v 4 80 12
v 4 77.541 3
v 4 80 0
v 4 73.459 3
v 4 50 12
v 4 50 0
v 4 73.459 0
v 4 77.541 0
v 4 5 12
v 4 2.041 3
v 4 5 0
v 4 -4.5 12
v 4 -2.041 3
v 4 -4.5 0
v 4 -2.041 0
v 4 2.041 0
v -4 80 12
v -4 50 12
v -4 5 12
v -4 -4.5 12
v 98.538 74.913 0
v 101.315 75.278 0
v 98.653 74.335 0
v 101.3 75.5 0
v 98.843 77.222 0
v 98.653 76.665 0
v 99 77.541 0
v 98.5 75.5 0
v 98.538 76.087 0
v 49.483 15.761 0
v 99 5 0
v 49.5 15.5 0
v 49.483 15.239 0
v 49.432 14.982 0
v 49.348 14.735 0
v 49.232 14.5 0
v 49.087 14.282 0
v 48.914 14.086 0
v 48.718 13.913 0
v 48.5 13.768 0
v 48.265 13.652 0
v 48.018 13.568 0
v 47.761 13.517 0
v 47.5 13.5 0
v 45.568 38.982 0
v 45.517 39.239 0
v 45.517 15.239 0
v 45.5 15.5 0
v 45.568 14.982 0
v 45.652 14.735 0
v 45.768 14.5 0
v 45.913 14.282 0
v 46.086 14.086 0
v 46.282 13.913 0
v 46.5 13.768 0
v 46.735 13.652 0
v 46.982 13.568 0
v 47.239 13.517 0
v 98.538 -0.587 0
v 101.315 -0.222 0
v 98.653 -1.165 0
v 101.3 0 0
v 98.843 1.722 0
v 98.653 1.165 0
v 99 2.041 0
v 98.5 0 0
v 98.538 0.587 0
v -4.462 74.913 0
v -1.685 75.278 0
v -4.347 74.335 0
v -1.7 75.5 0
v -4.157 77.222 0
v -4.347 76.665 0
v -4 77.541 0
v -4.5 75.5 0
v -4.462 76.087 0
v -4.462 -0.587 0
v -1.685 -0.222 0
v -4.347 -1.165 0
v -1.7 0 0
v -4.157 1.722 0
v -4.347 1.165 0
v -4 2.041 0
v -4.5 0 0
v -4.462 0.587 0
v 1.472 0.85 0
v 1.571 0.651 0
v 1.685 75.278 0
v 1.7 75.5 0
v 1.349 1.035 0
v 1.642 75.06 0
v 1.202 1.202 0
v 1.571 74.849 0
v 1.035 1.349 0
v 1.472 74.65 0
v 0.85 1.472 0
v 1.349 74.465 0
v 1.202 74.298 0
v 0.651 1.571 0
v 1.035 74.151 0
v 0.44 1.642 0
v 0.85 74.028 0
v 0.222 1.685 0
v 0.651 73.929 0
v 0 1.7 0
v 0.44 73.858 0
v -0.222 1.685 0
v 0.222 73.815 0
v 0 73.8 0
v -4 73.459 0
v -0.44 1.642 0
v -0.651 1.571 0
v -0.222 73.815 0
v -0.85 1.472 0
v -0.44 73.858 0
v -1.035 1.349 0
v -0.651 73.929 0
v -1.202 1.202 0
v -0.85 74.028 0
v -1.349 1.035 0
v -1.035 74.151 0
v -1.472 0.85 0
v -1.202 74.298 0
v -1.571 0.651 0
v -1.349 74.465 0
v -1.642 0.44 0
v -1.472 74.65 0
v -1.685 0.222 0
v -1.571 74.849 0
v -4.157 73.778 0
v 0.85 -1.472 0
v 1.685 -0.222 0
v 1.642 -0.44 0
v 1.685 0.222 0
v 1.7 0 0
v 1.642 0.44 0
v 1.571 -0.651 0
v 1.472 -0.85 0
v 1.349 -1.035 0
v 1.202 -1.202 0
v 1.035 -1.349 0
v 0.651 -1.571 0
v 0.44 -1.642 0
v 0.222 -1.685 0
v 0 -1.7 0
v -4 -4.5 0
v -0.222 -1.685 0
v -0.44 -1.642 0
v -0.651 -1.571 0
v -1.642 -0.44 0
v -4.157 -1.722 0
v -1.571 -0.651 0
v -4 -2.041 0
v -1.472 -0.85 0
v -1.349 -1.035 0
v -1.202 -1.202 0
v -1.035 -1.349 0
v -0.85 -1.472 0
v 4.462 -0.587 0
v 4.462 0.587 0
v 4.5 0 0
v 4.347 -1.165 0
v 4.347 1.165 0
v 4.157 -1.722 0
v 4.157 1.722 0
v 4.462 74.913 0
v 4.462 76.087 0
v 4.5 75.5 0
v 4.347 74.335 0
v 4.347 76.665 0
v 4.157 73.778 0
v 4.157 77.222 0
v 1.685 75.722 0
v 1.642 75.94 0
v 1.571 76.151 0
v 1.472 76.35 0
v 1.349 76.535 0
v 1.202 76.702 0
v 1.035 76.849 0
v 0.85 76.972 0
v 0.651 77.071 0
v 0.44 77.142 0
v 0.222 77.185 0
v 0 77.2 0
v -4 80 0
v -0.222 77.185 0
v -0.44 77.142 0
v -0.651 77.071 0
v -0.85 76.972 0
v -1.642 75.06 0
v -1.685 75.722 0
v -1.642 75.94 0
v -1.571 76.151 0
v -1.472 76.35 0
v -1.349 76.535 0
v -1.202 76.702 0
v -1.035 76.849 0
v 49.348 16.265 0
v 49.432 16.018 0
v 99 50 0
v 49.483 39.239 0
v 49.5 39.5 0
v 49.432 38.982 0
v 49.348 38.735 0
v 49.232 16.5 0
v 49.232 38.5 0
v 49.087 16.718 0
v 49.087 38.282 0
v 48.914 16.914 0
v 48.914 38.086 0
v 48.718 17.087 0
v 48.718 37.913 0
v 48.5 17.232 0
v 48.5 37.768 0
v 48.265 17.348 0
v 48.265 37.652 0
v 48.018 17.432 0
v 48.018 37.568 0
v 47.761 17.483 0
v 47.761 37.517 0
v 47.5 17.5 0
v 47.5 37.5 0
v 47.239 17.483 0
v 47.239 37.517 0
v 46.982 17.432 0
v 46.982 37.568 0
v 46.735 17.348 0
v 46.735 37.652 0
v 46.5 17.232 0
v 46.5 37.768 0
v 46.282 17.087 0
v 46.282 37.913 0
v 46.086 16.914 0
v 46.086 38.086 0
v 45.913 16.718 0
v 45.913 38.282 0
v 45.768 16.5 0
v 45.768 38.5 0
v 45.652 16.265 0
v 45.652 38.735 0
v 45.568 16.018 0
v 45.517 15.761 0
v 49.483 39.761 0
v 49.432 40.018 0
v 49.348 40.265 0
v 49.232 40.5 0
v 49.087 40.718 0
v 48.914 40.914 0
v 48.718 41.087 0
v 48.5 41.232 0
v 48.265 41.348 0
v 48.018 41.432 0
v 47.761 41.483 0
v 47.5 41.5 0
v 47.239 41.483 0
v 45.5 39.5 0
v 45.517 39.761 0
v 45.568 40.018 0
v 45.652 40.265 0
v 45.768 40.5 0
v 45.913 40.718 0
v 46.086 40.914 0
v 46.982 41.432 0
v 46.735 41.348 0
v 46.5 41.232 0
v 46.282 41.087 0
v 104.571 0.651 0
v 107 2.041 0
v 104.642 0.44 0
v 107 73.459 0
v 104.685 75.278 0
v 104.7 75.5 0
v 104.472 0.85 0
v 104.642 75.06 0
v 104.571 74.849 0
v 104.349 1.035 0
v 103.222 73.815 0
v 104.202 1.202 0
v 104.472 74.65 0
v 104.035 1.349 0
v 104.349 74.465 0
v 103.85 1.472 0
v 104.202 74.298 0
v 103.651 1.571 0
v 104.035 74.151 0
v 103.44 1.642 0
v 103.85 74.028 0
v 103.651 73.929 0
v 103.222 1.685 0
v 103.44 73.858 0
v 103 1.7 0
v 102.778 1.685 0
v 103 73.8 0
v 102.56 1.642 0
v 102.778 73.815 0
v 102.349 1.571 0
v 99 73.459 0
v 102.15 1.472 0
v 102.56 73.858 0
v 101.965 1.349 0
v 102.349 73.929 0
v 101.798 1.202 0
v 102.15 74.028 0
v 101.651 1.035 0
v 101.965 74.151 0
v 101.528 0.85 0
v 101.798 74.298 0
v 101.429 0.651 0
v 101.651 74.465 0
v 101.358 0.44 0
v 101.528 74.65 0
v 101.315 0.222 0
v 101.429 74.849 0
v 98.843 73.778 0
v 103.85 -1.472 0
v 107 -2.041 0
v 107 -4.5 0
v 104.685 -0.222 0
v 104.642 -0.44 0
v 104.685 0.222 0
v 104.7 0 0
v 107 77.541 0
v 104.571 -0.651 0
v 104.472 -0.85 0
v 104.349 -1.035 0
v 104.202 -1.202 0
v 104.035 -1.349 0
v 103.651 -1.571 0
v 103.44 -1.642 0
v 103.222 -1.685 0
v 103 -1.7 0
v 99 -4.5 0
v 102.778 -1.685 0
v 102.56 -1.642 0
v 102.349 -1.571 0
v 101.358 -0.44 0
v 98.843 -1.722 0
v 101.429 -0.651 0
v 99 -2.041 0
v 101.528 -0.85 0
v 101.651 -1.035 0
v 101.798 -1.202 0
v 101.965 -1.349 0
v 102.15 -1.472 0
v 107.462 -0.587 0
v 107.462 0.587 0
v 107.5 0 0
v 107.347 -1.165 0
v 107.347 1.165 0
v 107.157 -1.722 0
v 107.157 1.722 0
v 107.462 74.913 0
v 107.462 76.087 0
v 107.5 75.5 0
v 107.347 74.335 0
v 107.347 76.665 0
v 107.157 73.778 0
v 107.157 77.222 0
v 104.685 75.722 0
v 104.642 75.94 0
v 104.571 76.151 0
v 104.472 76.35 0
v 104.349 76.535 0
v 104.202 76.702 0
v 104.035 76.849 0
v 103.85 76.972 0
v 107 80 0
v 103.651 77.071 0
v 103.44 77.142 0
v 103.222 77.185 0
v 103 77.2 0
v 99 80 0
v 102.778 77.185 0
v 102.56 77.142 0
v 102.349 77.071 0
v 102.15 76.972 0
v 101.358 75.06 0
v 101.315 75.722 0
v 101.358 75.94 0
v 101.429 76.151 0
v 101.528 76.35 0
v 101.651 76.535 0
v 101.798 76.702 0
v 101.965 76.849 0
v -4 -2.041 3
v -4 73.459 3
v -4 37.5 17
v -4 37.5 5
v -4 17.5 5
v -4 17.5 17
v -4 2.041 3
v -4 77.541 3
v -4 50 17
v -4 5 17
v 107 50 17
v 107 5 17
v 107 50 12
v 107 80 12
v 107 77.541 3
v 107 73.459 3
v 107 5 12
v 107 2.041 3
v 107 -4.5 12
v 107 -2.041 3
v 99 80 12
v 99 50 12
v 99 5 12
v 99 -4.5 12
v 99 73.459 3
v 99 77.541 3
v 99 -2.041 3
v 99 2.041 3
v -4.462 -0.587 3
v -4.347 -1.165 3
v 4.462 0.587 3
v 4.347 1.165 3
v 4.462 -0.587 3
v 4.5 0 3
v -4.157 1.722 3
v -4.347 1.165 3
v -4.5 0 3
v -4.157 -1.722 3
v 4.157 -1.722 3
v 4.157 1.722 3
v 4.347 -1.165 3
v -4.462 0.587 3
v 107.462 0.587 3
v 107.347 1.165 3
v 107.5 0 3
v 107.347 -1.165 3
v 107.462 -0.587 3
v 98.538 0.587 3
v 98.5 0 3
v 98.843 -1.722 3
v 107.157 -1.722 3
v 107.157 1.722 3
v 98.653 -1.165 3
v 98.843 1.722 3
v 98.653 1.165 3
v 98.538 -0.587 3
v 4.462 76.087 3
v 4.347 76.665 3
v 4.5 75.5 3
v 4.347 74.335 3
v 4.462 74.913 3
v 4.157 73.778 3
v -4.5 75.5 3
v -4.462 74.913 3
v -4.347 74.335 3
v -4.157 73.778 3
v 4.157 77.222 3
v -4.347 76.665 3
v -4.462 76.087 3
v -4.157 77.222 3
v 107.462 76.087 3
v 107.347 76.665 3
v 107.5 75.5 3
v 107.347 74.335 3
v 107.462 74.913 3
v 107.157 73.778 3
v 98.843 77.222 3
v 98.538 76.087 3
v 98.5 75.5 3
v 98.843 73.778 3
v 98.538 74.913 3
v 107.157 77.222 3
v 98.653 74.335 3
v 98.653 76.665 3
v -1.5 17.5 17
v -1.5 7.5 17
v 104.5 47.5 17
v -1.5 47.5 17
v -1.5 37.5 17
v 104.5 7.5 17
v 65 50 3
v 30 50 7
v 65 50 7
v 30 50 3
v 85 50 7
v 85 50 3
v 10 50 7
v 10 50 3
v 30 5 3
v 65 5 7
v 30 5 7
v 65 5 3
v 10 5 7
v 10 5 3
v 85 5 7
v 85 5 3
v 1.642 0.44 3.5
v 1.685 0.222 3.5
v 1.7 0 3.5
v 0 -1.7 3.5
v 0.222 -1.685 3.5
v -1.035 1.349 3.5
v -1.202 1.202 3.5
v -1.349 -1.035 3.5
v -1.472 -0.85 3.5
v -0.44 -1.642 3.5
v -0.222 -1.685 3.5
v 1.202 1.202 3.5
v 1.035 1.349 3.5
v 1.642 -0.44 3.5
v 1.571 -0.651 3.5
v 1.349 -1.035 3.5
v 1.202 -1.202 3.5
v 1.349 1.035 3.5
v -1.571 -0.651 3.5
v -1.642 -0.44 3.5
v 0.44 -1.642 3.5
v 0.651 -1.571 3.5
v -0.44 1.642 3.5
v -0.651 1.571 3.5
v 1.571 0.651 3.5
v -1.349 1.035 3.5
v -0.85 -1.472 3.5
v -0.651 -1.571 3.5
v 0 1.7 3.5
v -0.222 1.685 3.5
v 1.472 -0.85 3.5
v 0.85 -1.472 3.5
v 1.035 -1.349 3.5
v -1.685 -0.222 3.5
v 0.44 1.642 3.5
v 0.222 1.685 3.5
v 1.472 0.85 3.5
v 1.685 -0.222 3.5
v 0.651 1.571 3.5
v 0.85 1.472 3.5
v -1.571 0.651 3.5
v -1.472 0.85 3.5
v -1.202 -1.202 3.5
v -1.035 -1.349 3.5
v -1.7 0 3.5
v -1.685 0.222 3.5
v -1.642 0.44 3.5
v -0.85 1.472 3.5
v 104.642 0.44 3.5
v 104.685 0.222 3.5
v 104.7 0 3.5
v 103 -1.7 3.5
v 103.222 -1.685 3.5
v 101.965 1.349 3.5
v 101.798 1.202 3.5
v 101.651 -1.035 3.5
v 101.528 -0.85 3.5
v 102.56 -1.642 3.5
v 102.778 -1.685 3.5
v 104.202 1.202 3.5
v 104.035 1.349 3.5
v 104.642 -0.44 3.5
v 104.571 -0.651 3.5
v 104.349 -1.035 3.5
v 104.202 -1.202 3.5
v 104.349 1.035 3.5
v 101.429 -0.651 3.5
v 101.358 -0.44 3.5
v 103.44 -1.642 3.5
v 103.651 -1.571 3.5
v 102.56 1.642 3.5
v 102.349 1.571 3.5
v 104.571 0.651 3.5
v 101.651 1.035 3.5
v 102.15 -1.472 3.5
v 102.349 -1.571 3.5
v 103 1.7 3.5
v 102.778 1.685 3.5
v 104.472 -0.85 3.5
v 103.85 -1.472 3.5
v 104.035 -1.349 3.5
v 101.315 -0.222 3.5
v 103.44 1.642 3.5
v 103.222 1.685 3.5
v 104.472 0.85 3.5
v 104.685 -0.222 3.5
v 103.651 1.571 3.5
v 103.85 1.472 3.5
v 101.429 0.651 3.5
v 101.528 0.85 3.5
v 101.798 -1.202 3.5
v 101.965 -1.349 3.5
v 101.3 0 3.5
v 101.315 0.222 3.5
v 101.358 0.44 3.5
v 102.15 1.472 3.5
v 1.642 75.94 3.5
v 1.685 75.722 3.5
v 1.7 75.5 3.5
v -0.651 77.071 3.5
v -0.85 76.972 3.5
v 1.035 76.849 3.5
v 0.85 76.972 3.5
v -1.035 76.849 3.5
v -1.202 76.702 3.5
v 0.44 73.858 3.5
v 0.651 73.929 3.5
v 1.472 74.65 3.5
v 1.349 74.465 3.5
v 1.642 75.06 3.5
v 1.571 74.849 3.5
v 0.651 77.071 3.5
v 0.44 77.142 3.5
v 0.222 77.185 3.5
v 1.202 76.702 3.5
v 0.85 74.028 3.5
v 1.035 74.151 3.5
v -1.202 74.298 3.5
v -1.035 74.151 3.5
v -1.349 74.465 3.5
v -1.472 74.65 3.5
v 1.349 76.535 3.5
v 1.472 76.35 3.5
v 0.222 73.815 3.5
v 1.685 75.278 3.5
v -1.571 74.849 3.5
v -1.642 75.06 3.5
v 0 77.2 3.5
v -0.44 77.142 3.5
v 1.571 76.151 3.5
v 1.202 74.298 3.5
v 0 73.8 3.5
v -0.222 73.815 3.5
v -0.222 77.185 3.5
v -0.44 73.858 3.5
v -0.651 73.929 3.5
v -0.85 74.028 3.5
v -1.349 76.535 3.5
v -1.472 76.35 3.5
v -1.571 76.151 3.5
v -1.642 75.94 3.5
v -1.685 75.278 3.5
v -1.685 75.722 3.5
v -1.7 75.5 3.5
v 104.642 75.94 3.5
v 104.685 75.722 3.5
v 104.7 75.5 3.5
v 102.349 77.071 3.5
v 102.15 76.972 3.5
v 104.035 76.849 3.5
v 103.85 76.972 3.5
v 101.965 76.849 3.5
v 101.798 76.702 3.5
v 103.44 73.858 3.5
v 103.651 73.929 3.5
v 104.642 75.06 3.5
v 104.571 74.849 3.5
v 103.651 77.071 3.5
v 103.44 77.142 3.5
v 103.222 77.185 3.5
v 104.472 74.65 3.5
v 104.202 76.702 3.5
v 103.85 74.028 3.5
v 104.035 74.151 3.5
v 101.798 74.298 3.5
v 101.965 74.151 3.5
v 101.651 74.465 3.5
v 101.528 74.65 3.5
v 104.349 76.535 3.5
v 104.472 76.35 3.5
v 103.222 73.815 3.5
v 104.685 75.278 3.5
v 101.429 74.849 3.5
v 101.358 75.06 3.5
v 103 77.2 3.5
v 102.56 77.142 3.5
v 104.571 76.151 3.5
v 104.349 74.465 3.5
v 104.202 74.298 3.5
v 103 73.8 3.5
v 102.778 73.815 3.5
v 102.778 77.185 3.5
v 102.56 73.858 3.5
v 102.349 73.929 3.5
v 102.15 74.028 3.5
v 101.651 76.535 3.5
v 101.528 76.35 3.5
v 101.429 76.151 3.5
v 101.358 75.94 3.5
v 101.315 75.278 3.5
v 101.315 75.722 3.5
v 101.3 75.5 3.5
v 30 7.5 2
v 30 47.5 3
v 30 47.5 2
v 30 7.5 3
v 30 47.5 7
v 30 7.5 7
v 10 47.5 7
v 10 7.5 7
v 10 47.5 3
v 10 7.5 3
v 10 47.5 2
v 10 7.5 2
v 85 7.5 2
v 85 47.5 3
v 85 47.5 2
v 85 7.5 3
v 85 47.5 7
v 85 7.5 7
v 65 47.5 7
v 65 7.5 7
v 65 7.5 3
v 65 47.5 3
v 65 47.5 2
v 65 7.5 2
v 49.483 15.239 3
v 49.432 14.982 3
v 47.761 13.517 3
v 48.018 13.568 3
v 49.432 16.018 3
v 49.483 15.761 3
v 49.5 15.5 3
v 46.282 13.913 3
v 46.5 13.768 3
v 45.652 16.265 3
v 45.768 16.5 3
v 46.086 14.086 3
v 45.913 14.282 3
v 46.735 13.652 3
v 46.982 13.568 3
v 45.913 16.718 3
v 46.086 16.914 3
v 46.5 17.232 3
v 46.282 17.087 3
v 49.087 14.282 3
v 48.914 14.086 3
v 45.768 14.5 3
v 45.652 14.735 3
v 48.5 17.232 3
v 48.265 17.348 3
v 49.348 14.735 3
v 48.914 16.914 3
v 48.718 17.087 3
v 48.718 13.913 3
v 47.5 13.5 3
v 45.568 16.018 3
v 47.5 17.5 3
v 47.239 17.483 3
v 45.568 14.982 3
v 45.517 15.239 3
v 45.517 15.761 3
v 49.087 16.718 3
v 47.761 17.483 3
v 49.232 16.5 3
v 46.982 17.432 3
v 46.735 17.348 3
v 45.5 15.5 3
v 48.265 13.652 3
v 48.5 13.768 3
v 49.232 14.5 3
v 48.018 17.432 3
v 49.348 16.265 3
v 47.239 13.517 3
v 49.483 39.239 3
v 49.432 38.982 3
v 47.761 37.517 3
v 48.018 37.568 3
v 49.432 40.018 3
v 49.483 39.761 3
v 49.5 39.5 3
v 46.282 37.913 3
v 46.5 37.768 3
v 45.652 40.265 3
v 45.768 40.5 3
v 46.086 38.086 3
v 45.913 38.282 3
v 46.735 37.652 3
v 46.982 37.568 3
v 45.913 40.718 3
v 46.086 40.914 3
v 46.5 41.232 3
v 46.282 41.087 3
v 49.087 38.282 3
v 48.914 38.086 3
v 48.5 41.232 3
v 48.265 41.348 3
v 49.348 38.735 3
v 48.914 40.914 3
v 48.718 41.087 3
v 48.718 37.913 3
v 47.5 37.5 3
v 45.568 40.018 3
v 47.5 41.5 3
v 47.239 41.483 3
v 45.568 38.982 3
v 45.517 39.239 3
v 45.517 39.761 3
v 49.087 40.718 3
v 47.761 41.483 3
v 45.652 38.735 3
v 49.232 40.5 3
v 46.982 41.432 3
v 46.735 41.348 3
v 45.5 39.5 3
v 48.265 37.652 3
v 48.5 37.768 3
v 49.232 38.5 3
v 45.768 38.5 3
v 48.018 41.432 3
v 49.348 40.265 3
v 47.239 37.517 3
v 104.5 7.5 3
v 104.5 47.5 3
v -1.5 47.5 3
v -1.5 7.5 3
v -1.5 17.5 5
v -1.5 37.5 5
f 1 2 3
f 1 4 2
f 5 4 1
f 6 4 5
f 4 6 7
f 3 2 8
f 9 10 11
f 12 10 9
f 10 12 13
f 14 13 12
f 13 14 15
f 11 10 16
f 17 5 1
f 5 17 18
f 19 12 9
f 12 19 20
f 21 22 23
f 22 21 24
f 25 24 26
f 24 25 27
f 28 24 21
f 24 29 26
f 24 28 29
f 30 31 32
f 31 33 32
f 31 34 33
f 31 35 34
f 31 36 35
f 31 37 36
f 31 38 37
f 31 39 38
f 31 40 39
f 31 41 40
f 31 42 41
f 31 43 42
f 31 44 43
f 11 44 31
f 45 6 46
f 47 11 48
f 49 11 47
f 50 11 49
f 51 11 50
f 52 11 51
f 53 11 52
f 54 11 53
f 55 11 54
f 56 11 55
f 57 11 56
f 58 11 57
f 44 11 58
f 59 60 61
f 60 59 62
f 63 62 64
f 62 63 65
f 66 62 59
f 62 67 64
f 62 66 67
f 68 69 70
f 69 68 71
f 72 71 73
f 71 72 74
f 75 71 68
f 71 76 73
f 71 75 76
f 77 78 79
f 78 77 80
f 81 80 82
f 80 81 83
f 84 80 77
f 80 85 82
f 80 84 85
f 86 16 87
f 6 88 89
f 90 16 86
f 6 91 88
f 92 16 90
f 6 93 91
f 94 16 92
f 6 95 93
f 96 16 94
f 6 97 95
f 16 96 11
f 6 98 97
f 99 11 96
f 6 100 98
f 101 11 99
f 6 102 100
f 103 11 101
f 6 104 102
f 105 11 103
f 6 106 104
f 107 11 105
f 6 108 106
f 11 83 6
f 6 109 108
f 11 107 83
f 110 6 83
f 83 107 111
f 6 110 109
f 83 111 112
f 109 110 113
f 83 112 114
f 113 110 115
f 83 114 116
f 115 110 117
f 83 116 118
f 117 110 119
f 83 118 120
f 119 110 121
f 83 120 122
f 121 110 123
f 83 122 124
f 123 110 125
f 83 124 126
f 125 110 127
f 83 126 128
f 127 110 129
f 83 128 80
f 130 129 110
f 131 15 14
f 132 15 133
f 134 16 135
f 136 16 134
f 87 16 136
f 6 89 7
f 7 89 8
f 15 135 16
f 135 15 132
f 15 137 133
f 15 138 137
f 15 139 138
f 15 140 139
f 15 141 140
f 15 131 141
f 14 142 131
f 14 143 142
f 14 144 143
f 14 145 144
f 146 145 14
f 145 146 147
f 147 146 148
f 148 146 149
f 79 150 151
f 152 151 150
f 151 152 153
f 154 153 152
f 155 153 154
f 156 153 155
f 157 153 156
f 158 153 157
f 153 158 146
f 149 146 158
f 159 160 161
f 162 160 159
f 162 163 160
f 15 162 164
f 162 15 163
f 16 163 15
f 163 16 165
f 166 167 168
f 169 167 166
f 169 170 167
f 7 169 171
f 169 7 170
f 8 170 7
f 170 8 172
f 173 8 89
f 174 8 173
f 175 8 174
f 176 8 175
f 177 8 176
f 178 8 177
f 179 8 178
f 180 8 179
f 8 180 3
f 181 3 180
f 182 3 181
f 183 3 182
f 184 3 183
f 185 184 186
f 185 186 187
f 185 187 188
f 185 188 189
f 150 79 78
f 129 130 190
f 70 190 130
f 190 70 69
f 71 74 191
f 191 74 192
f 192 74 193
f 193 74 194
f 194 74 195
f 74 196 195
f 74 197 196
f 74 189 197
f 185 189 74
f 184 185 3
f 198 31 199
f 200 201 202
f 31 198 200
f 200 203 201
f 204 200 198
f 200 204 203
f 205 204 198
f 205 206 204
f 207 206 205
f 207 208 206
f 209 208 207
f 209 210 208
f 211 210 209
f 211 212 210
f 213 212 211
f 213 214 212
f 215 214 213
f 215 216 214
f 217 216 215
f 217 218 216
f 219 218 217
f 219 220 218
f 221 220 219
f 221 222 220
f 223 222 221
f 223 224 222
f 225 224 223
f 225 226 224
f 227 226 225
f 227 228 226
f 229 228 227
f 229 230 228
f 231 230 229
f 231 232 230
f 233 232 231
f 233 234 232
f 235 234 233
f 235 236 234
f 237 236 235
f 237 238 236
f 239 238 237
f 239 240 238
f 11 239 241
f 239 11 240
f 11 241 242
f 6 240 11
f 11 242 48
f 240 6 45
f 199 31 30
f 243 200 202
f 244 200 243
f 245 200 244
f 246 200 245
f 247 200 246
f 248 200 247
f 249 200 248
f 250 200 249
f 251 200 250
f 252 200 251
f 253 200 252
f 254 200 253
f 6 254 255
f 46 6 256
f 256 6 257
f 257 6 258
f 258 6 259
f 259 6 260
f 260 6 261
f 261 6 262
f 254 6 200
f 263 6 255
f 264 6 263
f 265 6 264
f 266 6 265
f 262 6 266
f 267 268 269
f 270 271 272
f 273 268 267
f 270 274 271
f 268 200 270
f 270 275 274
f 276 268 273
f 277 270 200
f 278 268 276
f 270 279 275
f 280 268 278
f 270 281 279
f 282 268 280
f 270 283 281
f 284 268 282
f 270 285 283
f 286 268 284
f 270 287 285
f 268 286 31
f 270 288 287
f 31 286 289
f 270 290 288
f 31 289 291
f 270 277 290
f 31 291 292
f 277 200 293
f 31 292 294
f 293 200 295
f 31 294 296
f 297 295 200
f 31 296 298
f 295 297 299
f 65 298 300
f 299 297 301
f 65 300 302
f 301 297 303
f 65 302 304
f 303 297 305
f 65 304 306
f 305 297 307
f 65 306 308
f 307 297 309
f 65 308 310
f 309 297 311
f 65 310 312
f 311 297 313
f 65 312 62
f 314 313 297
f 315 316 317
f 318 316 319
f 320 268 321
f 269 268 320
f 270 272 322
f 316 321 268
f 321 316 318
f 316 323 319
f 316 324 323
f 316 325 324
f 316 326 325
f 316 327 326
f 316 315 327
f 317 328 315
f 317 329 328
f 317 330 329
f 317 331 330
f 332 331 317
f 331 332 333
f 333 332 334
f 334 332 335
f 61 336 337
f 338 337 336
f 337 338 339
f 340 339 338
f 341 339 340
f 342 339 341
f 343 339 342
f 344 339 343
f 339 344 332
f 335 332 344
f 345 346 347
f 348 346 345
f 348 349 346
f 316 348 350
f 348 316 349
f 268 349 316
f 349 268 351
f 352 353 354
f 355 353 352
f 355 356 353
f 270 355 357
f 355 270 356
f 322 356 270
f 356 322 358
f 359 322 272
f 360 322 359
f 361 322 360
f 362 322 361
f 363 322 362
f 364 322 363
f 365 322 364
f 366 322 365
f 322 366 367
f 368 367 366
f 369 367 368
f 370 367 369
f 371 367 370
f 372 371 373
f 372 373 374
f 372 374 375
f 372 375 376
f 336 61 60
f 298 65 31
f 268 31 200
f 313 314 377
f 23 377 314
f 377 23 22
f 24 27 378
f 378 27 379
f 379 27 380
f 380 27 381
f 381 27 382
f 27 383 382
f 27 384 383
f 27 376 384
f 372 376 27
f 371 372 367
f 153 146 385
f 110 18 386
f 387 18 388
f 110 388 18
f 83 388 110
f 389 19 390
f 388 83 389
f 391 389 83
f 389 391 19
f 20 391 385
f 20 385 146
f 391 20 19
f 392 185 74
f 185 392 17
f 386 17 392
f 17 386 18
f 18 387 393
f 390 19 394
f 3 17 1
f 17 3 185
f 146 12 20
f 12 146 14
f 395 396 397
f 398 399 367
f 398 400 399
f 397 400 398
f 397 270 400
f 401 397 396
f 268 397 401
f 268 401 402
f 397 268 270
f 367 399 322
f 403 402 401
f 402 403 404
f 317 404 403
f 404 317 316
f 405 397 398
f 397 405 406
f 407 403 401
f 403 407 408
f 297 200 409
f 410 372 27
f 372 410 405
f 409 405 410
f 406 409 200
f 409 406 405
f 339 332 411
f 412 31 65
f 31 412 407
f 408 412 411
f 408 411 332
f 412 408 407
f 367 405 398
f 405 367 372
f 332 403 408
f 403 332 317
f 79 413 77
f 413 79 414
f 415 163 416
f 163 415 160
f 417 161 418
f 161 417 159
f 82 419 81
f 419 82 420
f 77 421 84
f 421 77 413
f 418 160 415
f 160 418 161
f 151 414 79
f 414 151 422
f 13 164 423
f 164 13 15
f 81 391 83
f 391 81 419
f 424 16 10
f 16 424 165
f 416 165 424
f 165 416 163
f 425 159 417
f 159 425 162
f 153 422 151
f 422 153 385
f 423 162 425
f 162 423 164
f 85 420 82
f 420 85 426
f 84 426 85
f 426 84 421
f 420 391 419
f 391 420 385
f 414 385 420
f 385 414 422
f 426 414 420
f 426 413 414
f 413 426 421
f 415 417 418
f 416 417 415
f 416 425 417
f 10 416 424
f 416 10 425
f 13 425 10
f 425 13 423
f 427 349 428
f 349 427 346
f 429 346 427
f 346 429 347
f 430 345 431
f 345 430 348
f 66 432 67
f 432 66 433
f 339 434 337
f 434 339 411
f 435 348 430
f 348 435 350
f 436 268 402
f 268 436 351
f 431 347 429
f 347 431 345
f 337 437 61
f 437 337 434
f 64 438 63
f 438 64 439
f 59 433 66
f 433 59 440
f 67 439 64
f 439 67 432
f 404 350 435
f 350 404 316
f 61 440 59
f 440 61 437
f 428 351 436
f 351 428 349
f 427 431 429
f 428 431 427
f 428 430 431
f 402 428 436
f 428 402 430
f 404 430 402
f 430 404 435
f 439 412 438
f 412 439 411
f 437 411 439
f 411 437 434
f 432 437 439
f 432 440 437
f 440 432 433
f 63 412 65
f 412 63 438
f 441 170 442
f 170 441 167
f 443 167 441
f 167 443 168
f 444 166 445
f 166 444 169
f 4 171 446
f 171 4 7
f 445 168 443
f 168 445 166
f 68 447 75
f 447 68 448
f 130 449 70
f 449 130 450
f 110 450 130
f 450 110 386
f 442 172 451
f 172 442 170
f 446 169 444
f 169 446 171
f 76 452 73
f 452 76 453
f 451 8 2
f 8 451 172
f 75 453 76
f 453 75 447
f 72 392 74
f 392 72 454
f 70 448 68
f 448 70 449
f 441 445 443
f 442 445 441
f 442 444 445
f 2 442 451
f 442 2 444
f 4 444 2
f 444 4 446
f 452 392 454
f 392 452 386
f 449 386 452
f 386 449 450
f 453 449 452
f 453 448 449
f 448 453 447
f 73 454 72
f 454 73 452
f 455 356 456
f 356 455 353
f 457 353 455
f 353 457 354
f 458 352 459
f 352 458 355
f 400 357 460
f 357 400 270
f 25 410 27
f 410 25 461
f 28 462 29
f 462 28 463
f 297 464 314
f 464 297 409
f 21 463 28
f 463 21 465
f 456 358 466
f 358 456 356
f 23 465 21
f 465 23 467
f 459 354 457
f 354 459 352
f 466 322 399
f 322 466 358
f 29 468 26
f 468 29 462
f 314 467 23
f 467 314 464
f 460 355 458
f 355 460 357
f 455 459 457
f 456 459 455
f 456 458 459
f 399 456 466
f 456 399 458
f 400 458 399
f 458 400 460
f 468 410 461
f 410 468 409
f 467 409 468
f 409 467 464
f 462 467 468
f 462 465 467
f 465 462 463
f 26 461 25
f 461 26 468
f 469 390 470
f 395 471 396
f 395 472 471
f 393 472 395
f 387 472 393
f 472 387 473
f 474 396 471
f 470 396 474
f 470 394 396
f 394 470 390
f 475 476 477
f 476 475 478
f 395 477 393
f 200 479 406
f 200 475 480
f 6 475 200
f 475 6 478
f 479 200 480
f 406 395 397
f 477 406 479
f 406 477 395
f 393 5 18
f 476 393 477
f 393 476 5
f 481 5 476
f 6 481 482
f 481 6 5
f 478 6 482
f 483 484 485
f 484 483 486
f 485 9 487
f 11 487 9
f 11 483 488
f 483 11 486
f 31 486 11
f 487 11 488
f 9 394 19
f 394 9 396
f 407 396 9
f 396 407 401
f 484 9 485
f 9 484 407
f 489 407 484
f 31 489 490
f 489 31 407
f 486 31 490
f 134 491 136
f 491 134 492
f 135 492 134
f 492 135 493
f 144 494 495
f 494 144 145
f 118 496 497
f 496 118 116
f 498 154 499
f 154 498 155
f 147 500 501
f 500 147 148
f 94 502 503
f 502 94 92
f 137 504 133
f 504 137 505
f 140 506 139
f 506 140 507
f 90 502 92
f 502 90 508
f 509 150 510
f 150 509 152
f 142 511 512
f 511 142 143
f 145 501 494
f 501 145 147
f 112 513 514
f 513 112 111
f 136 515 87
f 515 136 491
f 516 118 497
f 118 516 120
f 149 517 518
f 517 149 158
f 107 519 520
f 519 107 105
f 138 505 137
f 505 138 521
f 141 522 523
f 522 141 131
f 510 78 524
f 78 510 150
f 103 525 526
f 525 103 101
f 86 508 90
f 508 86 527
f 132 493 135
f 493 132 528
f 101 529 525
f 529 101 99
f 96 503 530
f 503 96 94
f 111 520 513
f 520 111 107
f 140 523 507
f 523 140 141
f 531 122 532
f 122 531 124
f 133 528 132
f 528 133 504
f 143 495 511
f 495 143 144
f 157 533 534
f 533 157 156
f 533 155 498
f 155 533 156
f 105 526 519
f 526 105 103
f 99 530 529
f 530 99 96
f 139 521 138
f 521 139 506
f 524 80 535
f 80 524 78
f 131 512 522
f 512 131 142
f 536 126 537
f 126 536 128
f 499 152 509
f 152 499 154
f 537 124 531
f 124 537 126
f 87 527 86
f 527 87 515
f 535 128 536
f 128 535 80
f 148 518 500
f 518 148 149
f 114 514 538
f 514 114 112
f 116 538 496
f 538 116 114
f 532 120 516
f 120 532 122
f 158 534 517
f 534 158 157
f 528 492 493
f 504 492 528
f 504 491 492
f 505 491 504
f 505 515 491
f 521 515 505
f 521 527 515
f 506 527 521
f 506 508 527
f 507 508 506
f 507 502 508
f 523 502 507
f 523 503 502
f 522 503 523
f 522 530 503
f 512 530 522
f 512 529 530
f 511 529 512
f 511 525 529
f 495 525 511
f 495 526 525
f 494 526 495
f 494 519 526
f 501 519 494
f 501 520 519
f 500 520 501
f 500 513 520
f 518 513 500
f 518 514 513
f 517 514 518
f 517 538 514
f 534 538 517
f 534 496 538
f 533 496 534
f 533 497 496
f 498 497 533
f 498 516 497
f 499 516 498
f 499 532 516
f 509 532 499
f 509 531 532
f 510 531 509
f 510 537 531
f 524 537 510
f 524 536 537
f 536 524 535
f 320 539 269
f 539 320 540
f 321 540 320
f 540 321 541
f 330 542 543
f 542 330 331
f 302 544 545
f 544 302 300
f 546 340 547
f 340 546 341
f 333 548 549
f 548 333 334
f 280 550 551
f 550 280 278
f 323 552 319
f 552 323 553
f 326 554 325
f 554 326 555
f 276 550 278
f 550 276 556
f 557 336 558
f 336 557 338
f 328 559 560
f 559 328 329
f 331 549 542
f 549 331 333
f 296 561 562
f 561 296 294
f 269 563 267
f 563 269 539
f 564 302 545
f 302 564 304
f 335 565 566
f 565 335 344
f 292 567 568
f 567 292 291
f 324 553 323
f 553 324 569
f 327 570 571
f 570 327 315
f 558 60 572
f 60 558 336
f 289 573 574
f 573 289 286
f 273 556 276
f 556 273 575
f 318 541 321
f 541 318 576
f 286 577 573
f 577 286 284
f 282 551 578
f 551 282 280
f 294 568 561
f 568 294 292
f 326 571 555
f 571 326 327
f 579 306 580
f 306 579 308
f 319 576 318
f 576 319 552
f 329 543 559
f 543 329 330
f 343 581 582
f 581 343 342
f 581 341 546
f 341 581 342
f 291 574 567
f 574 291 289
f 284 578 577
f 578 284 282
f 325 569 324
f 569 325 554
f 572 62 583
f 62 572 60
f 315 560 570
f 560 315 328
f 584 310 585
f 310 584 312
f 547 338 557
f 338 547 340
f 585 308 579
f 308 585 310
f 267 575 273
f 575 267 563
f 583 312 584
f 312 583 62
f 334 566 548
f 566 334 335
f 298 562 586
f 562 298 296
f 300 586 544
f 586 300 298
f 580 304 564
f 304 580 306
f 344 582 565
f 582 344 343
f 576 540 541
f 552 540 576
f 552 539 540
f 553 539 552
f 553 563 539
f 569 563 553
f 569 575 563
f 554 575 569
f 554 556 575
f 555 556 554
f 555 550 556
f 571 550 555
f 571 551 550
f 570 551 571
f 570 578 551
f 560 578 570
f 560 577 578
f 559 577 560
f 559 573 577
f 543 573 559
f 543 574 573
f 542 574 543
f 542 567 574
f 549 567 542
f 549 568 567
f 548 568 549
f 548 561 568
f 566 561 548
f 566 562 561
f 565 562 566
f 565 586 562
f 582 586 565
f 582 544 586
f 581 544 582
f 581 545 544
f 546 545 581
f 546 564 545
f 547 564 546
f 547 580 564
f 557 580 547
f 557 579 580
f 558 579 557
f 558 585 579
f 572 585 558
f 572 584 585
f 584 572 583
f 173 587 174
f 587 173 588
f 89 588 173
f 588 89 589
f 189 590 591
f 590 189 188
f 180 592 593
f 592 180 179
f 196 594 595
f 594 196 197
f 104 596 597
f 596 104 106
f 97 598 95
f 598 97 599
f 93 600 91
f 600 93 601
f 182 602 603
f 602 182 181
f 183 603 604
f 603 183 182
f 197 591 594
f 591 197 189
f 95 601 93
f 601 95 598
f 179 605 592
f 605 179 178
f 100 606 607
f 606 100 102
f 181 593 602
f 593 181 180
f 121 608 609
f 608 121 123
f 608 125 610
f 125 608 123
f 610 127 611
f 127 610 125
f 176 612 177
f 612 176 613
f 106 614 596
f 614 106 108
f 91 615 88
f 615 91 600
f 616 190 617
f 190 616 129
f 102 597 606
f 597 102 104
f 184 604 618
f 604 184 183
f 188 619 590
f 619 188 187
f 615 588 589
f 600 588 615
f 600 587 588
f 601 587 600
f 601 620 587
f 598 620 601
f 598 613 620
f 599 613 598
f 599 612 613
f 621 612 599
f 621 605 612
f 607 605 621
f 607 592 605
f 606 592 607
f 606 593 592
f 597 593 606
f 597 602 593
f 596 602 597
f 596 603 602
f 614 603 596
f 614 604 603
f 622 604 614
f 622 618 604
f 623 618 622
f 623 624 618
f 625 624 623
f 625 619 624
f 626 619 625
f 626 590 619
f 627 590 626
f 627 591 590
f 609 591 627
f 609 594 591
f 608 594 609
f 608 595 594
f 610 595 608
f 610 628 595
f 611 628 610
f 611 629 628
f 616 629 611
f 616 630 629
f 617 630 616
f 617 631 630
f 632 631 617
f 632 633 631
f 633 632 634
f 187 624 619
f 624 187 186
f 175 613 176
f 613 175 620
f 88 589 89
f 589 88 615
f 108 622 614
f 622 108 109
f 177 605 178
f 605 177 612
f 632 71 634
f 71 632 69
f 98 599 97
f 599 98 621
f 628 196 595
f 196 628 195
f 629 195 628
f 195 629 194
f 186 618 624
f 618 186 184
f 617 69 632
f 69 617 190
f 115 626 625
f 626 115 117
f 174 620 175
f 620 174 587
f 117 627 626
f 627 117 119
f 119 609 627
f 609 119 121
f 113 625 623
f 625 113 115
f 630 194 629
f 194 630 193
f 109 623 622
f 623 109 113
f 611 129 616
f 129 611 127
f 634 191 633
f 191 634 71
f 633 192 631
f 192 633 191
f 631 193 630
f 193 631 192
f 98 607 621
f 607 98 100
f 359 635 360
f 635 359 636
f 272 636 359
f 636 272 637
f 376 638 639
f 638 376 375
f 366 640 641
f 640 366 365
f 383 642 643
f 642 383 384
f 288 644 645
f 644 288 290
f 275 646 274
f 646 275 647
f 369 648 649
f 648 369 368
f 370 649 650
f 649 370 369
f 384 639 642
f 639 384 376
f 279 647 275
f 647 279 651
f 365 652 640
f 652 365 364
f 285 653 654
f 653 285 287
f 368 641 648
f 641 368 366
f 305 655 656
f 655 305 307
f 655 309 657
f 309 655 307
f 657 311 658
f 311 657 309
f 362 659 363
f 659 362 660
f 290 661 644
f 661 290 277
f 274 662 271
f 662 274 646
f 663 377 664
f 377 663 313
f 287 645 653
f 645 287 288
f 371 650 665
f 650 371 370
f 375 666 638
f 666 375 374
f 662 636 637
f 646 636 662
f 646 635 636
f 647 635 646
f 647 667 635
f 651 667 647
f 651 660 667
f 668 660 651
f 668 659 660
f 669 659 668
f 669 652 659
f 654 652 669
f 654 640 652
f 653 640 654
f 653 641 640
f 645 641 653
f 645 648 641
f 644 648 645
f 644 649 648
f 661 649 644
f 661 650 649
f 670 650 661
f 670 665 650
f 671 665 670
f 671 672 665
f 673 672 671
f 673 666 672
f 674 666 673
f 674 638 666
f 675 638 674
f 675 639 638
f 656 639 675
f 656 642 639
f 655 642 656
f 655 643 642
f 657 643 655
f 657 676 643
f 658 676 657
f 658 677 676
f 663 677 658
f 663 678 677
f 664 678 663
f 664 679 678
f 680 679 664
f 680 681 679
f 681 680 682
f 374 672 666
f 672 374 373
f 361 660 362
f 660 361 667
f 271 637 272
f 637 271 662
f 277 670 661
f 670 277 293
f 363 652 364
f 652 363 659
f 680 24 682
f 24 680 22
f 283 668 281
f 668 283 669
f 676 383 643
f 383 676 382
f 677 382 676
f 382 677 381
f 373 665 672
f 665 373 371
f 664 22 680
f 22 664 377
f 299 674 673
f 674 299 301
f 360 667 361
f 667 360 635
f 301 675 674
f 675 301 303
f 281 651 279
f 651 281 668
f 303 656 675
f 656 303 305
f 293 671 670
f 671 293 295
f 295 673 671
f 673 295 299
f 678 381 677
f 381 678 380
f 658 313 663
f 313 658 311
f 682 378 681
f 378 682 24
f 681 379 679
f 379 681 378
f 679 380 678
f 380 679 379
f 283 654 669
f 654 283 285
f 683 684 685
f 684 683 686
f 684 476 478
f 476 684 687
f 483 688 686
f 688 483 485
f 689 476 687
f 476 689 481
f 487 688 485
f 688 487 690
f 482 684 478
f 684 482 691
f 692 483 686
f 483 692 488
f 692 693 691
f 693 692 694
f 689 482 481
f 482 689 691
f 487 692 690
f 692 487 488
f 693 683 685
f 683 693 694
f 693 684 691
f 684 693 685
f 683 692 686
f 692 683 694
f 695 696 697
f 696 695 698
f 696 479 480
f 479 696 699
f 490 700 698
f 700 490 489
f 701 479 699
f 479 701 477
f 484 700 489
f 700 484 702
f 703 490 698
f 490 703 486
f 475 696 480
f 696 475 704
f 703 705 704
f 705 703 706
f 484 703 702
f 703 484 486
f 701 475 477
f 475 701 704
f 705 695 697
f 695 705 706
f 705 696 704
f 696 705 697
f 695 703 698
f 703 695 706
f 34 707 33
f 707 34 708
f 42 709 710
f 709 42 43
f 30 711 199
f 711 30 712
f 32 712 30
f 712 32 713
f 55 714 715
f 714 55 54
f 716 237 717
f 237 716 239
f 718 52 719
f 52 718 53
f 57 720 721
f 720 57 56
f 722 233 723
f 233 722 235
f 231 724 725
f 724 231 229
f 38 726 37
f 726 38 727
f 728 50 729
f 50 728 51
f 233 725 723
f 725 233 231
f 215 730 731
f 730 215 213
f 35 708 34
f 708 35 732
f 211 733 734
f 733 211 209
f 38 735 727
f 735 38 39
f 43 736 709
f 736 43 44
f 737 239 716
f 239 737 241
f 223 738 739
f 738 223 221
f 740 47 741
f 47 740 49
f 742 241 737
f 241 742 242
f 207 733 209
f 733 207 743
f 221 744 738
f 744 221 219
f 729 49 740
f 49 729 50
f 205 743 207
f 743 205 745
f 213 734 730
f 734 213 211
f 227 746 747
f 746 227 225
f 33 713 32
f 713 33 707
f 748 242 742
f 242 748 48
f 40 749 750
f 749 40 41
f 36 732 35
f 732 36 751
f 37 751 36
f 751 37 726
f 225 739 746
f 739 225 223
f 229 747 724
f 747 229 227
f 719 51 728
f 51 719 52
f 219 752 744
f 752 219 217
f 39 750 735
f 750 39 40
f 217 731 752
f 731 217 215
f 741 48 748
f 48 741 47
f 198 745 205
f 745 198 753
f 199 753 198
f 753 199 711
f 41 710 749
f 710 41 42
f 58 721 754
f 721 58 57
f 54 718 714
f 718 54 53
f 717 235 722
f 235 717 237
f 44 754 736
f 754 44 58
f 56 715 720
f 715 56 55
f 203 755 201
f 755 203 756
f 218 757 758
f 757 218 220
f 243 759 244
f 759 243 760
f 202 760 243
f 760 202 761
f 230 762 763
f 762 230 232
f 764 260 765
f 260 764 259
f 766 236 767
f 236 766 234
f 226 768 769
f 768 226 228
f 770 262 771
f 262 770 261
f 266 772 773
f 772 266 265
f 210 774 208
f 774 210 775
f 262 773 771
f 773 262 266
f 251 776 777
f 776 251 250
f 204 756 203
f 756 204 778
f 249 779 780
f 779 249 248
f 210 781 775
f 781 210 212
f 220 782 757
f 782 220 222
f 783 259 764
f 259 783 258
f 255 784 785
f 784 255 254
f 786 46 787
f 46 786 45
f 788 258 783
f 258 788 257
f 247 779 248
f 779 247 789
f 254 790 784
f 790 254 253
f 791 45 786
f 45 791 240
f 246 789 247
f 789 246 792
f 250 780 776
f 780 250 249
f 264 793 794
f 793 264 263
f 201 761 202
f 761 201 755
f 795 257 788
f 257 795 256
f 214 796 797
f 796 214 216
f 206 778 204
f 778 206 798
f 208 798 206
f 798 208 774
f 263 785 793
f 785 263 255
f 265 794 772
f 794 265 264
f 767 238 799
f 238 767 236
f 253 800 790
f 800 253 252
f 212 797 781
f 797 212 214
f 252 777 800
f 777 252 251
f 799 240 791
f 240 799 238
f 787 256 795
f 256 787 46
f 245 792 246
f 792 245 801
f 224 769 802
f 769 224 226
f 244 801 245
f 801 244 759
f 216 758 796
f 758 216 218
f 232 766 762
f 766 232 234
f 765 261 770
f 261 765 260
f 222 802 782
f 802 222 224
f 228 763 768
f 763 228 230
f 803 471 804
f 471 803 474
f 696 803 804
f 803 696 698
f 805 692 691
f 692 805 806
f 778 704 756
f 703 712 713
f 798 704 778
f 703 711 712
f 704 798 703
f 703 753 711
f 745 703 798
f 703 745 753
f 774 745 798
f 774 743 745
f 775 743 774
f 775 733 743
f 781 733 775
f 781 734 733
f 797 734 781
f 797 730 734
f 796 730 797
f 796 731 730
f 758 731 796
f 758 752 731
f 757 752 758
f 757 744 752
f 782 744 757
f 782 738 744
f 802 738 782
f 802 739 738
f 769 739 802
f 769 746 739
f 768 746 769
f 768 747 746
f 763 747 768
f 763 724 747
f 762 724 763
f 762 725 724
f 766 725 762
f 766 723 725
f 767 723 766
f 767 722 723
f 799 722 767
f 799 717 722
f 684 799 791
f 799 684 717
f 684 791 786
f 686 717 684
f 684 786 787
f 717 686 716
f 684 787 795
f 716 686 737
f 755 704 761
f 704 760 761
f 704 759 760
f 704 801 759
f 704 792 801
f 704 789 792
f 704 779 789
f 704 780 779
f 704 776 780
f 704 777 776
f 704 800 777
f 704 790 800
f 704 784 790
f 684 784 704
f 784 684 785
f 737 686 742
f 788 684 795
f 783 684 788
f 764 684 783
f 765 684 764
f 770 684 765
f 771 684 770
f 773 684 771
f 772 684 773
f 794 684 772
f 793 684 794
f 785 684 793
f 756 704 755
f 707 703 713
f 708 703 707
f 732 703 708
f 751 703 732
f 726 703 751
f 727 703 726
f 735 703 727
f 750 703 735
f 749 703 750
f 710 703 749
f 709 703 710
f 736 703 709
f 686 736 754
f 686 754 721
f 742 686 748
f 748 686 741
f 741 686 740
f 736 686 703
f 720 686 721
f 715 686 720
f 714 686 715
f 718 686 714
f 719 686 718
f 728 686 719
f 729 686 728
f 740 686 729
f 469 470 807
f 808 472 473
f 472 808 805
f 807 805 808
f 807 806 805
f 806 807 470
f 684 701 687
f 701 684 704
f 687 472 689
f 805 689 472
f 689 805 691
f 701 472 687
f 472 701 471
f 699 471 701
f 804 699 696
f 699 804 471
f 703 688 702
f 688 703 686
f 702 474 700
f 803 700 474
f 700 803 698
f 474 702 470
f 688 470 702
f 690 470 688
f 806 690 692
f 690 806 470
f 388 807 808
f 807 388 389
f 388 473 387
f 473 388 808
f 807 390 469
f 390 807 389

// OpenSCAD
// =====================================================================
// parent_lipo_tray.scad — 親機 LiPo ブリッジトレイ (P-MAIN 上・最上段・交換しやすさ優先)
//
// 役割: LiPo Zeee 3S 2200 (102×34×23, ~170g) を P-MAIN の上に架けるトレイ。
//   P-MAIN の取付穴 4 点 (kicad 103×75.5 → プレート (6.5,10)(109.5,10)(6.5,85.5)
//   (109.5,85.5)) に M3 オス-メス スペーサ 25 mm (hex_spacer m3_mf25) を立て、
//   その上に本トレイを M3×6 ×4 で固定する。**LiPo は最上段** = 蓋を開ければ
//   ベルクロ帯を外して真上に抜ける (毎セッションの電池交換動線)。
// 高さ (箱底外面基準): プレート上面 18.8 → MAIN 基板上面 26.4 → スペーサ 25 →
//   トレイ下面 51.4 → 床 t3 → LiPo 下面 54.4 → LiPo 上面 77.4 (蓋パッキン面 90.9)。
//   MAIN の最高部品 (DS3231 スタック 18.5 → z 44.9) との隙間 6.5。
// 原点: MAIN 南西取付穴の中心 (プレート (6.5,10)) の直上、トレイ下面 z=0。
//   X = MAIN 穴ピッチ 103 方向、Y = 75.5 方向 (北)。
// 構造: ベイ (内寸 106×40, 壁 2.5, 床 3) を南側 2 穴の上に置き、東西 2 本の
//   レール (幅 8 × 高さ 12) で北側 2 穴へ架ける (4 点支持)。レールは MAIN の東西縁の上
//   z=51.4 を通る。リードは西端壁の切欠きから出て P-PWR J_BAT へ。
// 印刷向き: 平置き (+Z 上)。サポート不要。PETG / インフィル 30%。
// =====================================================================

/* [LiPo (lipo_3s_2200_zeee.md と二重定義 — 片方だけ直さない)] */
lipo_l   = 102;
lipo_w   = 34;
lipo_h   = 23;
end_pad  = 2;      // 長さ方向の片側余裕
side_pad = 3;      // 幅方向の片側余裕 (発泡パッド代)

/* [P-MAIN 取付穴 (PARENT_MAIN.kicad_pcb 実座標 → ピッチ)] */
hole_px  = 103;    // kicad (4.5→107.5)
hole_py  = 75.5;   // kicad (4.5→80)
hole_d   = 3.4;    // M3 通し
pad_d    = 9;      // 穴まわりの座

/* [トレイ] */
wall     = 2.5;
floor_t  = 3;
wall_h   = 14;     // 側壁高さ (LiPo 23 の 60%)
bay_x0   = -4;     // ベイ外形の X 開始 (穴中心基準)。ベイ中心 = 穴スパン中心 (51.5)
bay_y0   = 5;      // ベイ外形の Y 開始 (南穴の座 pad_d/2=4.5 の外)
rail_w   = 8;      // 東西レール幅 (穴中心線に載せる)
rail_h   = 12;     // レール高さ (t3 では落下 10G でたわみ 37mm → 12 で 0.6mm。quick_strength beam)
rail_y1  = 4.5;    // レール北端の穴からのはみ出し
drain_d  = 4;

/* [ベルクロ帯スロット] */
strap_w  = 20;
strap_t  = 4;
strap_x  = [24, 79];   // ベイ原点 (bay_x0) 基準の帯中心

/* [リード切欠き (西端壁)] */
lead_w   = 20;

/* [高さ検査 (spec/parent_interior_layout.py と二重定義)] */
spacer_l = 25;     // hex_spacer m3_mf25
main_top_comp = 18.49;   // MAIN 基板上面からの最高部品 (parent_main.md)
pcb_t    = 1.6;
plate_top_z = 18.8;      // 箱底外面基準
lid_z    = 90.9;         // 蓋パッキン面

$fn = 48;

// ---- 導出 -----------------------------------------------------------
in_l = lipo_l + 2*end_pad;      // 106
in_w = lipo_w + 2*side_pad;     // 40
L    = in_l + 2*wall;           // 111
W    = in_w + 2*wall;           // 45
holes = [[0, 0], [hole_px, 0], [0, hole_py], [hole_px, hole_py]];
tray_z0 = plate_top_z + 6 + pcb_t + spacer_l;   // 51.4 (ボス 6 + 基板 + スペーサ)
lipo_top_z = tray_z0 + floor_t + lipo_h;        // 77.4

// ---- 成立性チェック --------------------------------------------------
assert(abs((bay_x0 + L/2) - hole_px/2) < 0.01, "ベイ中心が穴スパン中心に無い");
assert(bay_y0 >= pad_d/2 - 0.01 || bay_y0 <= -W, "ベイ南壁が南穴の座に掛かる");
assert(bay_y0 + W < hole_py - pad_d/2, "ベイ北壁が北穴の座に掛かる");
assert(tray_z0 - (plate_top_z + 6 + pcb_t + main_top_comp) >= 3,
       str("トレイ下面と MAIN 最高部品の隙間不足: ", tray_z0 - (plate_top_z + 6 + pcb_t + main_top_comp)));
assert(lid_z - lipo_top_z >= 10, str("LiPo 上面と蓋の隙間不足 (交換時の手掛かり): ", lid_z - lipo_top_z));
assert(lead_w <= in_w - 2*8, "リード切欠きが広すぎ (端壁の残りが LiPo を止めない)");
for (x = strap_x)
    assert(x - strap_w/2 >= wall + 2 && x + strap_w/2 <= L - wall - 2, "帯スロットが端壁に接近");
assert(strap_x[1] - strap_x[0] >= strap_w + 2*drain_d + 6, "帯スロット同士が近い (水抜き穴が置けない)");
// 水抜き穴: 帯溝の間と両外側の帯溝を避けた位置
drain_xy = [for (x = [ (strap_x[0] + strap_x[1])/2 ], y = [wall + 8, W - wall - 8]) [x, y]];
for (d = drain_xy) for (x = strap_x)
    assert(abs(d[0] - x) >= strap_w/2 + drain_d/2 + 1, "水抜き穴が帯溝に掛かる");
// レールがベイ外形と重なって一体になること
assert(bay_x0 <= rail_w/2 && bay_x0 + L >= hole_px - rail_w/2, "レールがベイに接続しない");
assert(rail_h <= floor_t + wall_h, "レールがベイ壁より高い");
// レール (北穴への片持ち) の強度: 落下 10G で半分の LiPo 荷重 8.5 N、長さ 75.5
assert(rail_h >= 10, "レール高さ不足 (quick_strength: t>=10 でたわみ 1mm 以下)");

echo(str("parent_lipo_tray: bay ", L, "x", W, " at (", bay_x0, ",", bay_y0, "), tray z0=", tray_z0,
         " lipo top z=", lipo_top_z, " (lid ", lid_z, ")  cell plate-xy = ",
         [6.5 + bay_x0 + wall + end_pad, 10 + bay_y0 + wall + side_pad]));

// ---- 本体 -------------------------------------------------------------
difference() {
    union() {
        // ベイ
        translate([bay_x0, bay_y0, 0]) cube([L, W, floor_t + wall_h]);
        // 東西レール (南穴 → 北穴)
        for (x = [0, hole_px])
            translate([x - rail_w/2, -pad_d/2, 0]) cube([rail_w, hole_py + pad_d/2 + rail_y1, rail_h]);
        // 穴の座
        for (h = holes) translate([h[0], h[1], 0]) cylinder(d = pad_d, h = floor_t);
    }
    // ベイ内
    translate([bay_x0 + wall, bay_y0 + wall, floor_t]) cube([in_l, in_w, wall_h + 1]);
    // リード切欠き (西端壁)
    translate([bay_x0 - 0.5, bay_y0 + W/2 - lead_w/2, floor_t + 2]) cube([wall + 1, lead_w, wall_h + 1]);
    // M3 通し穴
    for (h = holes) translate([h[0], h[1], -0.5]) cylinder(d = hole_d, h = floor_t + 1);
    // ベルクロ帯: 側壁スロット + 床の浅い溝
    for (x = strap_x) {
        translate([bay_x0 + x - strap_w/2, bay_y0 - 0.5, floor_t]) cube([strap_w, W + 1, strap_t]);
        translate([bay_x0 + x - strap_w/2, bay_y0 + wall, floor_t - 1.0]) cube([strap_w, in_w, 1.5]);
    }
    // 水抜き穴
    for (d = drain_xy) translate([bay_x0 + d[0], bay_y0 + d[1], -0.5]) cylinder(d = drain_d, h = floor_t + 1);
}
